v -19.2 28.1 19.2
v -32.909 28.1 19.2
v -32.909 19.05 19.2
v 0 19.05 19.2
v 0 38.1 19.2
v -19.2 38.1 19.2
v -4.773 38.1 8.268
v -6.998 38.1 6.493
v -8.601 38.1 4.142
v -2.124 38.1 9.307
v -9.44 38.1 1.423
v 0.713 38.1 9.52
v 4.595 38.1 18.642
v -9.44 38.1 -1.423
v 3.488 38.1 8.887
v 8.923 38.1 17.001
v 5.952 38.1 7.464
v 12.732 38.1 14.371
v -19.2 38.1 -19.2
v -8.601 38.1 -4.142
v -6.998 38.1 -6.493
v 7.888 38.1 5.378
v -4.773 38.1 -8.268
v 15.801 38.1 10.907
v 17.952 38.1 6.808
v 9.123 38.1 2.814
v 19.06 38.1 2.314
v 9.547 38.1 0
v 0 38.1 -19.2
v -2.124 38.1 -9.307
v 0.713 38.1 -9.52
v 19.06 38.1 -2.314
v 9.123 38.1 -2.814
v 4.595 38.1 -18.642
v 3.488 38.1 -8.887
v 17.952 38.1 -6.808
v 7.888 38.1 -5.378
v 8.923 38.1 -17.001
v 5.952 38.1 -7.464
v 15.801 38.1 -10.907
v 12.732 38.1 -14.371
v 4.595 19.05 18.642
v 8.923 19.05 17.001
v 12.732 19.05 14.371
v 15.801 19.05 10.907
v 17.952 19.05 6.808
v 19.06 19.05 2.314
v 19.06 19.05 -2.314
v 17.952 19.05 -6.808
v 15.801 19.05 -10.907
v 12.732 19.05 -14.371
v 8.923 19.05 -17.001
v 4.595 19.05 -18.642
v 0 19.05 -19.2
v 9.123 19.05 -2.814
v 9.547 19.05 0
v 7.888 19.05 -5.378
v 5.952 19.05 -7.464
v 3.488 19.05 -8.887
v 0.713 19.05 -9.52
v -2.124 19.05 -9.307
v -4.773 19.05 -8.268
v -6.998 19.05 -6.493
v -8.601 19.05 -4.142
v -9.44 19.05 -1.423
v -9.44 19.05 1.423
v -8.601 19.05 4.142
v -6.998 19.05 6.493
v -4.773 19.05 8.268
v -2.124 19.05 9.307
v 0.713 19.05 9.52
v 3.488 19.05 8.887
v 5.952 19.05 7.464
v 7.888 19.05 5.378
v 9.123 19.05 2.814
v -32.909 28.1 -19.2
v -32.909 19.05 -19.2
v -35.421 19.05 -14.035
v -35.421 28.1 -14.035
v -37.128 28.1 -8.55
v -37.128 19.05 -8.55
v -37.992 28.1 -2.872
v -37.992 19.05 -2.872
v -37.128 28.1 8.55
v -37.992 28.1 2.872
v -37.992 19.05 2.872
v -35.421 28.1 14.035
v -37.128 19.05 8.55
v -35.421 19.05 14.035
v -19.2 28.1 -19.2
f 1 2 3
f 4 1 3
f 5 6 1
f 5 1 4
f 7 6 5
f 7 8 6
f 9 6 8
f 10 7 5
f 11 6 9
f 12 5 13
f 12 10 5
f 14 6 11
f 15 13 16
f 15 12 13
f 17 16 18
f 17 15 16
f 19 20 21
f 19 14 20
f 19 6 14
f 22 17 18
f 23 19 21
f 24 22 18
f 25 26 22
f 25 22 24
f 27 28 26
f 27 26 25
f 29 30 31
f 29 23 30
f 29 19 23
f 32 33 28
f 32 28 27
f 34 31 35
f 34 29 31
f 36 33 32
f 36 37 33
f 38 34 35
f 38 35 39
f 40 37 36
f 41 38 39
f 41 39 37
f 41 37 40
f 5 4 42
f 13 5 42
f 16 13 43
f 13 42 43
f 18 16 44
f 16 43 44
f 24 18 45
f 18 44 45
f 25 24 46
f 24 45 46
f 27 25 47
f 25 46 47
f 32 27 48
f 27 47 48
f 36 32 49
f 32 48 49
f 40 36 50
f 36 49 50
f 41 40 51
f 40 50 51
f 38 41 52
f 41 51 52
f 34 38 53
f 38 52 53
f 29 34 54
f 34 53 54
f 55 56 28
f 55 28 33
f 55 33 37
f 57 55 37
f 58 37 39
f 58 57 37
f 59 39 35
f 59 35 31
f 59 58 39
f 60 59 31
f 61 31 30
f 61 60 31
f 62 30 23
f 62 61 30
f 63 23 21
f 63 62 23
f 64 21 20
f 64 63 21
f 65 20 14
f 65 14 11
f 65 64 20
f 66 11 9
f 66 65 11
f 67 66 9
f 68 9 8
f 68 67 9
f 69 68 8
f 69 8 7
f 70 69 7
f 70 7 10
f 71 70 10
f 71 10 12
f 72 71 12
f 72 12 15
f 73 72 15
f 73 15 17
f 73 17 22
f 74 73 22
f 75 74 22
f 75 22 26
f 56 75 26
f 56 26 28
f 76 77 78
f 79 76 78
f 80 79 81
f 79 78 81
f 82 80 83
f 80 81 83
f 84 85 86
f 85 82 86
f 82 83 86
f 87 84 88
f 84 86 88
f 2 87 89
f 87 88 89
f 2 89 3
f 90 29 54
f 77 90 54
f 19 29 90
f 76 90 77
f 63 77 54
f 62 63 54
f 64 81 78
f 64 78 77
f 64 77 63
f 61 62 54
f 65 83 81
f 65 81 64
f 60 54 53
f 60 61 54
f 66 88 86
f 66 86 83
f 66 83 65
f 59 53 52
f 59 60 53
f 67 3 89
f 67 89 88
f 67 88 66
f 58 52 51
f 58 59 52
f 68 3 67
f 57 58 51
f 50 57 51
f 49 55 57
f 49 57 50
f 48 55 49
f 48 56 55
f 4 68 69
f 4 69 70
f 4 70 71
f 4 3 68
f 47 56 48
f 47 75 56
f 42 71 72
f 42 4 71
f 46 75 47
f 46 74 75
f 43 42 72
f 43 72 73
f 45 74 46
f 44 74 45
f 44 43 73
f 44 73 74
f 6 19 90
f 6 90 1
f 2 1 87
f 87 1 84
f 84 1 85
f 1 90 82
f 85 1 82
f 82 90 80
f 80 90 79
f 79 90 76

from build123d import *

# Parameters (mm, degrees)
SKETCH1_R               = 38.1
SKETCH1_R_2             = 9.546666028
BOSS_EXTRUDE1_DEPTH     = 38.1
SKETCH2_W               = 38.1
SKETCH2_H               = 19.05
CUT_EXTRUDE1_DEPTH      = 144.78
CUT_EXTRUDE2_DEPTH      = 22.86
CUT_EXTRUDE2_DEPTH_BACK = 20.32
SKETCH5_W               = 40.342749465
SKETCH5_H               = 23.10958947
CUT_EXTRUDE4_DEPTH      = 53.594
CUT_EXTRUDE5_DEPTH      = 10


with BuildPart() as part:
    # Sketch1 → Boss-Extrude1 (new body)
    with BuildSketch(Plane(origin=(0, 0, 0), x_dir=(1, 0, 0), z_dir=(0, 1, 0))):
        Circle(SKETCH1_R)
        Circle(SKETCH1_R_2, mode=Mode.SUBTRACT)
    extrude(amount=BOSS_EXTRUDE1_DEPTH)

    # Sketch2 → Cut-Extrude1 (cut)
    with BuildSketch(Plane.XY.offset(38.1)):
        with Locations((19.05, 9.525)):
            Rectangle(SKETCH2_W, SKETCH2_H)
    extrude(amount=-CUT_EXTRUDE1_DEPTH, mode=Mode.SUBTRACT)

    # Sketch3 → Cut-Extrude2 (cut, two sides)
    with BuildSketch(Plane.XZ.offset(-19.05)) as cut_extrude2_sk:
        with BuildLine():
            Line((0, -19.2), (-32.908509538, -19.2))
            ThreePointArc((-32.908509538, -19.2), (38.1, 0), (-32.908509538, 19.2))
            Line((-32.908509538, 19.2), (0, 19.2))
            ThreePointArc((0, 19.2), (19.2, 0), (0, -19.2))
        make_face()
    extrude(amount=CUT_EXTRUDE2_DEPTH, mode=Mode.SUBTRACT)
    extrude(cut_extrude2_sk.sketch, amount=-CUT_EXTRUDE2_DEPTH_BACK, mode=Mode.SUBTRACT)

    # Sketch5 → Cut-Extrude4 (cut)
    with BuildSketch(Plane.XY.offset(19.2)):
        with Locations((-20.171374733, 7.495205265)):
            Rectangle(SKETCH5_W, SKETCH5_H)
    extrude(amount=-CUT_EXTRUDE4_DEPTH, mode=Mode.SUBTRACT)

    # Sketch6 → Cut-Extrude5 (cut)
    with BuildSketch(Plane(origin=(0, 38.1, 0), x_dir=(1, 0, 0), z_dir=(0, 1, 0))):
        with BuildLine():
            Line((-19.2, 19.2), (-19.2, -19.2))
            Line((-19.2, -19.2), (-32.908509538, -19.2))
            ThreePointArc((-32.908509538, -19.2), (-38.1, 0), (-32.908509538, 19.2))
            Line((-32.908509538, 19.2), (-19.2, 19.2))
        make_face()
    extrude(amount=-CUT_EXTRUDE5_DEPTH, mode=Mode.SUBTRACT)


solid = part.part
